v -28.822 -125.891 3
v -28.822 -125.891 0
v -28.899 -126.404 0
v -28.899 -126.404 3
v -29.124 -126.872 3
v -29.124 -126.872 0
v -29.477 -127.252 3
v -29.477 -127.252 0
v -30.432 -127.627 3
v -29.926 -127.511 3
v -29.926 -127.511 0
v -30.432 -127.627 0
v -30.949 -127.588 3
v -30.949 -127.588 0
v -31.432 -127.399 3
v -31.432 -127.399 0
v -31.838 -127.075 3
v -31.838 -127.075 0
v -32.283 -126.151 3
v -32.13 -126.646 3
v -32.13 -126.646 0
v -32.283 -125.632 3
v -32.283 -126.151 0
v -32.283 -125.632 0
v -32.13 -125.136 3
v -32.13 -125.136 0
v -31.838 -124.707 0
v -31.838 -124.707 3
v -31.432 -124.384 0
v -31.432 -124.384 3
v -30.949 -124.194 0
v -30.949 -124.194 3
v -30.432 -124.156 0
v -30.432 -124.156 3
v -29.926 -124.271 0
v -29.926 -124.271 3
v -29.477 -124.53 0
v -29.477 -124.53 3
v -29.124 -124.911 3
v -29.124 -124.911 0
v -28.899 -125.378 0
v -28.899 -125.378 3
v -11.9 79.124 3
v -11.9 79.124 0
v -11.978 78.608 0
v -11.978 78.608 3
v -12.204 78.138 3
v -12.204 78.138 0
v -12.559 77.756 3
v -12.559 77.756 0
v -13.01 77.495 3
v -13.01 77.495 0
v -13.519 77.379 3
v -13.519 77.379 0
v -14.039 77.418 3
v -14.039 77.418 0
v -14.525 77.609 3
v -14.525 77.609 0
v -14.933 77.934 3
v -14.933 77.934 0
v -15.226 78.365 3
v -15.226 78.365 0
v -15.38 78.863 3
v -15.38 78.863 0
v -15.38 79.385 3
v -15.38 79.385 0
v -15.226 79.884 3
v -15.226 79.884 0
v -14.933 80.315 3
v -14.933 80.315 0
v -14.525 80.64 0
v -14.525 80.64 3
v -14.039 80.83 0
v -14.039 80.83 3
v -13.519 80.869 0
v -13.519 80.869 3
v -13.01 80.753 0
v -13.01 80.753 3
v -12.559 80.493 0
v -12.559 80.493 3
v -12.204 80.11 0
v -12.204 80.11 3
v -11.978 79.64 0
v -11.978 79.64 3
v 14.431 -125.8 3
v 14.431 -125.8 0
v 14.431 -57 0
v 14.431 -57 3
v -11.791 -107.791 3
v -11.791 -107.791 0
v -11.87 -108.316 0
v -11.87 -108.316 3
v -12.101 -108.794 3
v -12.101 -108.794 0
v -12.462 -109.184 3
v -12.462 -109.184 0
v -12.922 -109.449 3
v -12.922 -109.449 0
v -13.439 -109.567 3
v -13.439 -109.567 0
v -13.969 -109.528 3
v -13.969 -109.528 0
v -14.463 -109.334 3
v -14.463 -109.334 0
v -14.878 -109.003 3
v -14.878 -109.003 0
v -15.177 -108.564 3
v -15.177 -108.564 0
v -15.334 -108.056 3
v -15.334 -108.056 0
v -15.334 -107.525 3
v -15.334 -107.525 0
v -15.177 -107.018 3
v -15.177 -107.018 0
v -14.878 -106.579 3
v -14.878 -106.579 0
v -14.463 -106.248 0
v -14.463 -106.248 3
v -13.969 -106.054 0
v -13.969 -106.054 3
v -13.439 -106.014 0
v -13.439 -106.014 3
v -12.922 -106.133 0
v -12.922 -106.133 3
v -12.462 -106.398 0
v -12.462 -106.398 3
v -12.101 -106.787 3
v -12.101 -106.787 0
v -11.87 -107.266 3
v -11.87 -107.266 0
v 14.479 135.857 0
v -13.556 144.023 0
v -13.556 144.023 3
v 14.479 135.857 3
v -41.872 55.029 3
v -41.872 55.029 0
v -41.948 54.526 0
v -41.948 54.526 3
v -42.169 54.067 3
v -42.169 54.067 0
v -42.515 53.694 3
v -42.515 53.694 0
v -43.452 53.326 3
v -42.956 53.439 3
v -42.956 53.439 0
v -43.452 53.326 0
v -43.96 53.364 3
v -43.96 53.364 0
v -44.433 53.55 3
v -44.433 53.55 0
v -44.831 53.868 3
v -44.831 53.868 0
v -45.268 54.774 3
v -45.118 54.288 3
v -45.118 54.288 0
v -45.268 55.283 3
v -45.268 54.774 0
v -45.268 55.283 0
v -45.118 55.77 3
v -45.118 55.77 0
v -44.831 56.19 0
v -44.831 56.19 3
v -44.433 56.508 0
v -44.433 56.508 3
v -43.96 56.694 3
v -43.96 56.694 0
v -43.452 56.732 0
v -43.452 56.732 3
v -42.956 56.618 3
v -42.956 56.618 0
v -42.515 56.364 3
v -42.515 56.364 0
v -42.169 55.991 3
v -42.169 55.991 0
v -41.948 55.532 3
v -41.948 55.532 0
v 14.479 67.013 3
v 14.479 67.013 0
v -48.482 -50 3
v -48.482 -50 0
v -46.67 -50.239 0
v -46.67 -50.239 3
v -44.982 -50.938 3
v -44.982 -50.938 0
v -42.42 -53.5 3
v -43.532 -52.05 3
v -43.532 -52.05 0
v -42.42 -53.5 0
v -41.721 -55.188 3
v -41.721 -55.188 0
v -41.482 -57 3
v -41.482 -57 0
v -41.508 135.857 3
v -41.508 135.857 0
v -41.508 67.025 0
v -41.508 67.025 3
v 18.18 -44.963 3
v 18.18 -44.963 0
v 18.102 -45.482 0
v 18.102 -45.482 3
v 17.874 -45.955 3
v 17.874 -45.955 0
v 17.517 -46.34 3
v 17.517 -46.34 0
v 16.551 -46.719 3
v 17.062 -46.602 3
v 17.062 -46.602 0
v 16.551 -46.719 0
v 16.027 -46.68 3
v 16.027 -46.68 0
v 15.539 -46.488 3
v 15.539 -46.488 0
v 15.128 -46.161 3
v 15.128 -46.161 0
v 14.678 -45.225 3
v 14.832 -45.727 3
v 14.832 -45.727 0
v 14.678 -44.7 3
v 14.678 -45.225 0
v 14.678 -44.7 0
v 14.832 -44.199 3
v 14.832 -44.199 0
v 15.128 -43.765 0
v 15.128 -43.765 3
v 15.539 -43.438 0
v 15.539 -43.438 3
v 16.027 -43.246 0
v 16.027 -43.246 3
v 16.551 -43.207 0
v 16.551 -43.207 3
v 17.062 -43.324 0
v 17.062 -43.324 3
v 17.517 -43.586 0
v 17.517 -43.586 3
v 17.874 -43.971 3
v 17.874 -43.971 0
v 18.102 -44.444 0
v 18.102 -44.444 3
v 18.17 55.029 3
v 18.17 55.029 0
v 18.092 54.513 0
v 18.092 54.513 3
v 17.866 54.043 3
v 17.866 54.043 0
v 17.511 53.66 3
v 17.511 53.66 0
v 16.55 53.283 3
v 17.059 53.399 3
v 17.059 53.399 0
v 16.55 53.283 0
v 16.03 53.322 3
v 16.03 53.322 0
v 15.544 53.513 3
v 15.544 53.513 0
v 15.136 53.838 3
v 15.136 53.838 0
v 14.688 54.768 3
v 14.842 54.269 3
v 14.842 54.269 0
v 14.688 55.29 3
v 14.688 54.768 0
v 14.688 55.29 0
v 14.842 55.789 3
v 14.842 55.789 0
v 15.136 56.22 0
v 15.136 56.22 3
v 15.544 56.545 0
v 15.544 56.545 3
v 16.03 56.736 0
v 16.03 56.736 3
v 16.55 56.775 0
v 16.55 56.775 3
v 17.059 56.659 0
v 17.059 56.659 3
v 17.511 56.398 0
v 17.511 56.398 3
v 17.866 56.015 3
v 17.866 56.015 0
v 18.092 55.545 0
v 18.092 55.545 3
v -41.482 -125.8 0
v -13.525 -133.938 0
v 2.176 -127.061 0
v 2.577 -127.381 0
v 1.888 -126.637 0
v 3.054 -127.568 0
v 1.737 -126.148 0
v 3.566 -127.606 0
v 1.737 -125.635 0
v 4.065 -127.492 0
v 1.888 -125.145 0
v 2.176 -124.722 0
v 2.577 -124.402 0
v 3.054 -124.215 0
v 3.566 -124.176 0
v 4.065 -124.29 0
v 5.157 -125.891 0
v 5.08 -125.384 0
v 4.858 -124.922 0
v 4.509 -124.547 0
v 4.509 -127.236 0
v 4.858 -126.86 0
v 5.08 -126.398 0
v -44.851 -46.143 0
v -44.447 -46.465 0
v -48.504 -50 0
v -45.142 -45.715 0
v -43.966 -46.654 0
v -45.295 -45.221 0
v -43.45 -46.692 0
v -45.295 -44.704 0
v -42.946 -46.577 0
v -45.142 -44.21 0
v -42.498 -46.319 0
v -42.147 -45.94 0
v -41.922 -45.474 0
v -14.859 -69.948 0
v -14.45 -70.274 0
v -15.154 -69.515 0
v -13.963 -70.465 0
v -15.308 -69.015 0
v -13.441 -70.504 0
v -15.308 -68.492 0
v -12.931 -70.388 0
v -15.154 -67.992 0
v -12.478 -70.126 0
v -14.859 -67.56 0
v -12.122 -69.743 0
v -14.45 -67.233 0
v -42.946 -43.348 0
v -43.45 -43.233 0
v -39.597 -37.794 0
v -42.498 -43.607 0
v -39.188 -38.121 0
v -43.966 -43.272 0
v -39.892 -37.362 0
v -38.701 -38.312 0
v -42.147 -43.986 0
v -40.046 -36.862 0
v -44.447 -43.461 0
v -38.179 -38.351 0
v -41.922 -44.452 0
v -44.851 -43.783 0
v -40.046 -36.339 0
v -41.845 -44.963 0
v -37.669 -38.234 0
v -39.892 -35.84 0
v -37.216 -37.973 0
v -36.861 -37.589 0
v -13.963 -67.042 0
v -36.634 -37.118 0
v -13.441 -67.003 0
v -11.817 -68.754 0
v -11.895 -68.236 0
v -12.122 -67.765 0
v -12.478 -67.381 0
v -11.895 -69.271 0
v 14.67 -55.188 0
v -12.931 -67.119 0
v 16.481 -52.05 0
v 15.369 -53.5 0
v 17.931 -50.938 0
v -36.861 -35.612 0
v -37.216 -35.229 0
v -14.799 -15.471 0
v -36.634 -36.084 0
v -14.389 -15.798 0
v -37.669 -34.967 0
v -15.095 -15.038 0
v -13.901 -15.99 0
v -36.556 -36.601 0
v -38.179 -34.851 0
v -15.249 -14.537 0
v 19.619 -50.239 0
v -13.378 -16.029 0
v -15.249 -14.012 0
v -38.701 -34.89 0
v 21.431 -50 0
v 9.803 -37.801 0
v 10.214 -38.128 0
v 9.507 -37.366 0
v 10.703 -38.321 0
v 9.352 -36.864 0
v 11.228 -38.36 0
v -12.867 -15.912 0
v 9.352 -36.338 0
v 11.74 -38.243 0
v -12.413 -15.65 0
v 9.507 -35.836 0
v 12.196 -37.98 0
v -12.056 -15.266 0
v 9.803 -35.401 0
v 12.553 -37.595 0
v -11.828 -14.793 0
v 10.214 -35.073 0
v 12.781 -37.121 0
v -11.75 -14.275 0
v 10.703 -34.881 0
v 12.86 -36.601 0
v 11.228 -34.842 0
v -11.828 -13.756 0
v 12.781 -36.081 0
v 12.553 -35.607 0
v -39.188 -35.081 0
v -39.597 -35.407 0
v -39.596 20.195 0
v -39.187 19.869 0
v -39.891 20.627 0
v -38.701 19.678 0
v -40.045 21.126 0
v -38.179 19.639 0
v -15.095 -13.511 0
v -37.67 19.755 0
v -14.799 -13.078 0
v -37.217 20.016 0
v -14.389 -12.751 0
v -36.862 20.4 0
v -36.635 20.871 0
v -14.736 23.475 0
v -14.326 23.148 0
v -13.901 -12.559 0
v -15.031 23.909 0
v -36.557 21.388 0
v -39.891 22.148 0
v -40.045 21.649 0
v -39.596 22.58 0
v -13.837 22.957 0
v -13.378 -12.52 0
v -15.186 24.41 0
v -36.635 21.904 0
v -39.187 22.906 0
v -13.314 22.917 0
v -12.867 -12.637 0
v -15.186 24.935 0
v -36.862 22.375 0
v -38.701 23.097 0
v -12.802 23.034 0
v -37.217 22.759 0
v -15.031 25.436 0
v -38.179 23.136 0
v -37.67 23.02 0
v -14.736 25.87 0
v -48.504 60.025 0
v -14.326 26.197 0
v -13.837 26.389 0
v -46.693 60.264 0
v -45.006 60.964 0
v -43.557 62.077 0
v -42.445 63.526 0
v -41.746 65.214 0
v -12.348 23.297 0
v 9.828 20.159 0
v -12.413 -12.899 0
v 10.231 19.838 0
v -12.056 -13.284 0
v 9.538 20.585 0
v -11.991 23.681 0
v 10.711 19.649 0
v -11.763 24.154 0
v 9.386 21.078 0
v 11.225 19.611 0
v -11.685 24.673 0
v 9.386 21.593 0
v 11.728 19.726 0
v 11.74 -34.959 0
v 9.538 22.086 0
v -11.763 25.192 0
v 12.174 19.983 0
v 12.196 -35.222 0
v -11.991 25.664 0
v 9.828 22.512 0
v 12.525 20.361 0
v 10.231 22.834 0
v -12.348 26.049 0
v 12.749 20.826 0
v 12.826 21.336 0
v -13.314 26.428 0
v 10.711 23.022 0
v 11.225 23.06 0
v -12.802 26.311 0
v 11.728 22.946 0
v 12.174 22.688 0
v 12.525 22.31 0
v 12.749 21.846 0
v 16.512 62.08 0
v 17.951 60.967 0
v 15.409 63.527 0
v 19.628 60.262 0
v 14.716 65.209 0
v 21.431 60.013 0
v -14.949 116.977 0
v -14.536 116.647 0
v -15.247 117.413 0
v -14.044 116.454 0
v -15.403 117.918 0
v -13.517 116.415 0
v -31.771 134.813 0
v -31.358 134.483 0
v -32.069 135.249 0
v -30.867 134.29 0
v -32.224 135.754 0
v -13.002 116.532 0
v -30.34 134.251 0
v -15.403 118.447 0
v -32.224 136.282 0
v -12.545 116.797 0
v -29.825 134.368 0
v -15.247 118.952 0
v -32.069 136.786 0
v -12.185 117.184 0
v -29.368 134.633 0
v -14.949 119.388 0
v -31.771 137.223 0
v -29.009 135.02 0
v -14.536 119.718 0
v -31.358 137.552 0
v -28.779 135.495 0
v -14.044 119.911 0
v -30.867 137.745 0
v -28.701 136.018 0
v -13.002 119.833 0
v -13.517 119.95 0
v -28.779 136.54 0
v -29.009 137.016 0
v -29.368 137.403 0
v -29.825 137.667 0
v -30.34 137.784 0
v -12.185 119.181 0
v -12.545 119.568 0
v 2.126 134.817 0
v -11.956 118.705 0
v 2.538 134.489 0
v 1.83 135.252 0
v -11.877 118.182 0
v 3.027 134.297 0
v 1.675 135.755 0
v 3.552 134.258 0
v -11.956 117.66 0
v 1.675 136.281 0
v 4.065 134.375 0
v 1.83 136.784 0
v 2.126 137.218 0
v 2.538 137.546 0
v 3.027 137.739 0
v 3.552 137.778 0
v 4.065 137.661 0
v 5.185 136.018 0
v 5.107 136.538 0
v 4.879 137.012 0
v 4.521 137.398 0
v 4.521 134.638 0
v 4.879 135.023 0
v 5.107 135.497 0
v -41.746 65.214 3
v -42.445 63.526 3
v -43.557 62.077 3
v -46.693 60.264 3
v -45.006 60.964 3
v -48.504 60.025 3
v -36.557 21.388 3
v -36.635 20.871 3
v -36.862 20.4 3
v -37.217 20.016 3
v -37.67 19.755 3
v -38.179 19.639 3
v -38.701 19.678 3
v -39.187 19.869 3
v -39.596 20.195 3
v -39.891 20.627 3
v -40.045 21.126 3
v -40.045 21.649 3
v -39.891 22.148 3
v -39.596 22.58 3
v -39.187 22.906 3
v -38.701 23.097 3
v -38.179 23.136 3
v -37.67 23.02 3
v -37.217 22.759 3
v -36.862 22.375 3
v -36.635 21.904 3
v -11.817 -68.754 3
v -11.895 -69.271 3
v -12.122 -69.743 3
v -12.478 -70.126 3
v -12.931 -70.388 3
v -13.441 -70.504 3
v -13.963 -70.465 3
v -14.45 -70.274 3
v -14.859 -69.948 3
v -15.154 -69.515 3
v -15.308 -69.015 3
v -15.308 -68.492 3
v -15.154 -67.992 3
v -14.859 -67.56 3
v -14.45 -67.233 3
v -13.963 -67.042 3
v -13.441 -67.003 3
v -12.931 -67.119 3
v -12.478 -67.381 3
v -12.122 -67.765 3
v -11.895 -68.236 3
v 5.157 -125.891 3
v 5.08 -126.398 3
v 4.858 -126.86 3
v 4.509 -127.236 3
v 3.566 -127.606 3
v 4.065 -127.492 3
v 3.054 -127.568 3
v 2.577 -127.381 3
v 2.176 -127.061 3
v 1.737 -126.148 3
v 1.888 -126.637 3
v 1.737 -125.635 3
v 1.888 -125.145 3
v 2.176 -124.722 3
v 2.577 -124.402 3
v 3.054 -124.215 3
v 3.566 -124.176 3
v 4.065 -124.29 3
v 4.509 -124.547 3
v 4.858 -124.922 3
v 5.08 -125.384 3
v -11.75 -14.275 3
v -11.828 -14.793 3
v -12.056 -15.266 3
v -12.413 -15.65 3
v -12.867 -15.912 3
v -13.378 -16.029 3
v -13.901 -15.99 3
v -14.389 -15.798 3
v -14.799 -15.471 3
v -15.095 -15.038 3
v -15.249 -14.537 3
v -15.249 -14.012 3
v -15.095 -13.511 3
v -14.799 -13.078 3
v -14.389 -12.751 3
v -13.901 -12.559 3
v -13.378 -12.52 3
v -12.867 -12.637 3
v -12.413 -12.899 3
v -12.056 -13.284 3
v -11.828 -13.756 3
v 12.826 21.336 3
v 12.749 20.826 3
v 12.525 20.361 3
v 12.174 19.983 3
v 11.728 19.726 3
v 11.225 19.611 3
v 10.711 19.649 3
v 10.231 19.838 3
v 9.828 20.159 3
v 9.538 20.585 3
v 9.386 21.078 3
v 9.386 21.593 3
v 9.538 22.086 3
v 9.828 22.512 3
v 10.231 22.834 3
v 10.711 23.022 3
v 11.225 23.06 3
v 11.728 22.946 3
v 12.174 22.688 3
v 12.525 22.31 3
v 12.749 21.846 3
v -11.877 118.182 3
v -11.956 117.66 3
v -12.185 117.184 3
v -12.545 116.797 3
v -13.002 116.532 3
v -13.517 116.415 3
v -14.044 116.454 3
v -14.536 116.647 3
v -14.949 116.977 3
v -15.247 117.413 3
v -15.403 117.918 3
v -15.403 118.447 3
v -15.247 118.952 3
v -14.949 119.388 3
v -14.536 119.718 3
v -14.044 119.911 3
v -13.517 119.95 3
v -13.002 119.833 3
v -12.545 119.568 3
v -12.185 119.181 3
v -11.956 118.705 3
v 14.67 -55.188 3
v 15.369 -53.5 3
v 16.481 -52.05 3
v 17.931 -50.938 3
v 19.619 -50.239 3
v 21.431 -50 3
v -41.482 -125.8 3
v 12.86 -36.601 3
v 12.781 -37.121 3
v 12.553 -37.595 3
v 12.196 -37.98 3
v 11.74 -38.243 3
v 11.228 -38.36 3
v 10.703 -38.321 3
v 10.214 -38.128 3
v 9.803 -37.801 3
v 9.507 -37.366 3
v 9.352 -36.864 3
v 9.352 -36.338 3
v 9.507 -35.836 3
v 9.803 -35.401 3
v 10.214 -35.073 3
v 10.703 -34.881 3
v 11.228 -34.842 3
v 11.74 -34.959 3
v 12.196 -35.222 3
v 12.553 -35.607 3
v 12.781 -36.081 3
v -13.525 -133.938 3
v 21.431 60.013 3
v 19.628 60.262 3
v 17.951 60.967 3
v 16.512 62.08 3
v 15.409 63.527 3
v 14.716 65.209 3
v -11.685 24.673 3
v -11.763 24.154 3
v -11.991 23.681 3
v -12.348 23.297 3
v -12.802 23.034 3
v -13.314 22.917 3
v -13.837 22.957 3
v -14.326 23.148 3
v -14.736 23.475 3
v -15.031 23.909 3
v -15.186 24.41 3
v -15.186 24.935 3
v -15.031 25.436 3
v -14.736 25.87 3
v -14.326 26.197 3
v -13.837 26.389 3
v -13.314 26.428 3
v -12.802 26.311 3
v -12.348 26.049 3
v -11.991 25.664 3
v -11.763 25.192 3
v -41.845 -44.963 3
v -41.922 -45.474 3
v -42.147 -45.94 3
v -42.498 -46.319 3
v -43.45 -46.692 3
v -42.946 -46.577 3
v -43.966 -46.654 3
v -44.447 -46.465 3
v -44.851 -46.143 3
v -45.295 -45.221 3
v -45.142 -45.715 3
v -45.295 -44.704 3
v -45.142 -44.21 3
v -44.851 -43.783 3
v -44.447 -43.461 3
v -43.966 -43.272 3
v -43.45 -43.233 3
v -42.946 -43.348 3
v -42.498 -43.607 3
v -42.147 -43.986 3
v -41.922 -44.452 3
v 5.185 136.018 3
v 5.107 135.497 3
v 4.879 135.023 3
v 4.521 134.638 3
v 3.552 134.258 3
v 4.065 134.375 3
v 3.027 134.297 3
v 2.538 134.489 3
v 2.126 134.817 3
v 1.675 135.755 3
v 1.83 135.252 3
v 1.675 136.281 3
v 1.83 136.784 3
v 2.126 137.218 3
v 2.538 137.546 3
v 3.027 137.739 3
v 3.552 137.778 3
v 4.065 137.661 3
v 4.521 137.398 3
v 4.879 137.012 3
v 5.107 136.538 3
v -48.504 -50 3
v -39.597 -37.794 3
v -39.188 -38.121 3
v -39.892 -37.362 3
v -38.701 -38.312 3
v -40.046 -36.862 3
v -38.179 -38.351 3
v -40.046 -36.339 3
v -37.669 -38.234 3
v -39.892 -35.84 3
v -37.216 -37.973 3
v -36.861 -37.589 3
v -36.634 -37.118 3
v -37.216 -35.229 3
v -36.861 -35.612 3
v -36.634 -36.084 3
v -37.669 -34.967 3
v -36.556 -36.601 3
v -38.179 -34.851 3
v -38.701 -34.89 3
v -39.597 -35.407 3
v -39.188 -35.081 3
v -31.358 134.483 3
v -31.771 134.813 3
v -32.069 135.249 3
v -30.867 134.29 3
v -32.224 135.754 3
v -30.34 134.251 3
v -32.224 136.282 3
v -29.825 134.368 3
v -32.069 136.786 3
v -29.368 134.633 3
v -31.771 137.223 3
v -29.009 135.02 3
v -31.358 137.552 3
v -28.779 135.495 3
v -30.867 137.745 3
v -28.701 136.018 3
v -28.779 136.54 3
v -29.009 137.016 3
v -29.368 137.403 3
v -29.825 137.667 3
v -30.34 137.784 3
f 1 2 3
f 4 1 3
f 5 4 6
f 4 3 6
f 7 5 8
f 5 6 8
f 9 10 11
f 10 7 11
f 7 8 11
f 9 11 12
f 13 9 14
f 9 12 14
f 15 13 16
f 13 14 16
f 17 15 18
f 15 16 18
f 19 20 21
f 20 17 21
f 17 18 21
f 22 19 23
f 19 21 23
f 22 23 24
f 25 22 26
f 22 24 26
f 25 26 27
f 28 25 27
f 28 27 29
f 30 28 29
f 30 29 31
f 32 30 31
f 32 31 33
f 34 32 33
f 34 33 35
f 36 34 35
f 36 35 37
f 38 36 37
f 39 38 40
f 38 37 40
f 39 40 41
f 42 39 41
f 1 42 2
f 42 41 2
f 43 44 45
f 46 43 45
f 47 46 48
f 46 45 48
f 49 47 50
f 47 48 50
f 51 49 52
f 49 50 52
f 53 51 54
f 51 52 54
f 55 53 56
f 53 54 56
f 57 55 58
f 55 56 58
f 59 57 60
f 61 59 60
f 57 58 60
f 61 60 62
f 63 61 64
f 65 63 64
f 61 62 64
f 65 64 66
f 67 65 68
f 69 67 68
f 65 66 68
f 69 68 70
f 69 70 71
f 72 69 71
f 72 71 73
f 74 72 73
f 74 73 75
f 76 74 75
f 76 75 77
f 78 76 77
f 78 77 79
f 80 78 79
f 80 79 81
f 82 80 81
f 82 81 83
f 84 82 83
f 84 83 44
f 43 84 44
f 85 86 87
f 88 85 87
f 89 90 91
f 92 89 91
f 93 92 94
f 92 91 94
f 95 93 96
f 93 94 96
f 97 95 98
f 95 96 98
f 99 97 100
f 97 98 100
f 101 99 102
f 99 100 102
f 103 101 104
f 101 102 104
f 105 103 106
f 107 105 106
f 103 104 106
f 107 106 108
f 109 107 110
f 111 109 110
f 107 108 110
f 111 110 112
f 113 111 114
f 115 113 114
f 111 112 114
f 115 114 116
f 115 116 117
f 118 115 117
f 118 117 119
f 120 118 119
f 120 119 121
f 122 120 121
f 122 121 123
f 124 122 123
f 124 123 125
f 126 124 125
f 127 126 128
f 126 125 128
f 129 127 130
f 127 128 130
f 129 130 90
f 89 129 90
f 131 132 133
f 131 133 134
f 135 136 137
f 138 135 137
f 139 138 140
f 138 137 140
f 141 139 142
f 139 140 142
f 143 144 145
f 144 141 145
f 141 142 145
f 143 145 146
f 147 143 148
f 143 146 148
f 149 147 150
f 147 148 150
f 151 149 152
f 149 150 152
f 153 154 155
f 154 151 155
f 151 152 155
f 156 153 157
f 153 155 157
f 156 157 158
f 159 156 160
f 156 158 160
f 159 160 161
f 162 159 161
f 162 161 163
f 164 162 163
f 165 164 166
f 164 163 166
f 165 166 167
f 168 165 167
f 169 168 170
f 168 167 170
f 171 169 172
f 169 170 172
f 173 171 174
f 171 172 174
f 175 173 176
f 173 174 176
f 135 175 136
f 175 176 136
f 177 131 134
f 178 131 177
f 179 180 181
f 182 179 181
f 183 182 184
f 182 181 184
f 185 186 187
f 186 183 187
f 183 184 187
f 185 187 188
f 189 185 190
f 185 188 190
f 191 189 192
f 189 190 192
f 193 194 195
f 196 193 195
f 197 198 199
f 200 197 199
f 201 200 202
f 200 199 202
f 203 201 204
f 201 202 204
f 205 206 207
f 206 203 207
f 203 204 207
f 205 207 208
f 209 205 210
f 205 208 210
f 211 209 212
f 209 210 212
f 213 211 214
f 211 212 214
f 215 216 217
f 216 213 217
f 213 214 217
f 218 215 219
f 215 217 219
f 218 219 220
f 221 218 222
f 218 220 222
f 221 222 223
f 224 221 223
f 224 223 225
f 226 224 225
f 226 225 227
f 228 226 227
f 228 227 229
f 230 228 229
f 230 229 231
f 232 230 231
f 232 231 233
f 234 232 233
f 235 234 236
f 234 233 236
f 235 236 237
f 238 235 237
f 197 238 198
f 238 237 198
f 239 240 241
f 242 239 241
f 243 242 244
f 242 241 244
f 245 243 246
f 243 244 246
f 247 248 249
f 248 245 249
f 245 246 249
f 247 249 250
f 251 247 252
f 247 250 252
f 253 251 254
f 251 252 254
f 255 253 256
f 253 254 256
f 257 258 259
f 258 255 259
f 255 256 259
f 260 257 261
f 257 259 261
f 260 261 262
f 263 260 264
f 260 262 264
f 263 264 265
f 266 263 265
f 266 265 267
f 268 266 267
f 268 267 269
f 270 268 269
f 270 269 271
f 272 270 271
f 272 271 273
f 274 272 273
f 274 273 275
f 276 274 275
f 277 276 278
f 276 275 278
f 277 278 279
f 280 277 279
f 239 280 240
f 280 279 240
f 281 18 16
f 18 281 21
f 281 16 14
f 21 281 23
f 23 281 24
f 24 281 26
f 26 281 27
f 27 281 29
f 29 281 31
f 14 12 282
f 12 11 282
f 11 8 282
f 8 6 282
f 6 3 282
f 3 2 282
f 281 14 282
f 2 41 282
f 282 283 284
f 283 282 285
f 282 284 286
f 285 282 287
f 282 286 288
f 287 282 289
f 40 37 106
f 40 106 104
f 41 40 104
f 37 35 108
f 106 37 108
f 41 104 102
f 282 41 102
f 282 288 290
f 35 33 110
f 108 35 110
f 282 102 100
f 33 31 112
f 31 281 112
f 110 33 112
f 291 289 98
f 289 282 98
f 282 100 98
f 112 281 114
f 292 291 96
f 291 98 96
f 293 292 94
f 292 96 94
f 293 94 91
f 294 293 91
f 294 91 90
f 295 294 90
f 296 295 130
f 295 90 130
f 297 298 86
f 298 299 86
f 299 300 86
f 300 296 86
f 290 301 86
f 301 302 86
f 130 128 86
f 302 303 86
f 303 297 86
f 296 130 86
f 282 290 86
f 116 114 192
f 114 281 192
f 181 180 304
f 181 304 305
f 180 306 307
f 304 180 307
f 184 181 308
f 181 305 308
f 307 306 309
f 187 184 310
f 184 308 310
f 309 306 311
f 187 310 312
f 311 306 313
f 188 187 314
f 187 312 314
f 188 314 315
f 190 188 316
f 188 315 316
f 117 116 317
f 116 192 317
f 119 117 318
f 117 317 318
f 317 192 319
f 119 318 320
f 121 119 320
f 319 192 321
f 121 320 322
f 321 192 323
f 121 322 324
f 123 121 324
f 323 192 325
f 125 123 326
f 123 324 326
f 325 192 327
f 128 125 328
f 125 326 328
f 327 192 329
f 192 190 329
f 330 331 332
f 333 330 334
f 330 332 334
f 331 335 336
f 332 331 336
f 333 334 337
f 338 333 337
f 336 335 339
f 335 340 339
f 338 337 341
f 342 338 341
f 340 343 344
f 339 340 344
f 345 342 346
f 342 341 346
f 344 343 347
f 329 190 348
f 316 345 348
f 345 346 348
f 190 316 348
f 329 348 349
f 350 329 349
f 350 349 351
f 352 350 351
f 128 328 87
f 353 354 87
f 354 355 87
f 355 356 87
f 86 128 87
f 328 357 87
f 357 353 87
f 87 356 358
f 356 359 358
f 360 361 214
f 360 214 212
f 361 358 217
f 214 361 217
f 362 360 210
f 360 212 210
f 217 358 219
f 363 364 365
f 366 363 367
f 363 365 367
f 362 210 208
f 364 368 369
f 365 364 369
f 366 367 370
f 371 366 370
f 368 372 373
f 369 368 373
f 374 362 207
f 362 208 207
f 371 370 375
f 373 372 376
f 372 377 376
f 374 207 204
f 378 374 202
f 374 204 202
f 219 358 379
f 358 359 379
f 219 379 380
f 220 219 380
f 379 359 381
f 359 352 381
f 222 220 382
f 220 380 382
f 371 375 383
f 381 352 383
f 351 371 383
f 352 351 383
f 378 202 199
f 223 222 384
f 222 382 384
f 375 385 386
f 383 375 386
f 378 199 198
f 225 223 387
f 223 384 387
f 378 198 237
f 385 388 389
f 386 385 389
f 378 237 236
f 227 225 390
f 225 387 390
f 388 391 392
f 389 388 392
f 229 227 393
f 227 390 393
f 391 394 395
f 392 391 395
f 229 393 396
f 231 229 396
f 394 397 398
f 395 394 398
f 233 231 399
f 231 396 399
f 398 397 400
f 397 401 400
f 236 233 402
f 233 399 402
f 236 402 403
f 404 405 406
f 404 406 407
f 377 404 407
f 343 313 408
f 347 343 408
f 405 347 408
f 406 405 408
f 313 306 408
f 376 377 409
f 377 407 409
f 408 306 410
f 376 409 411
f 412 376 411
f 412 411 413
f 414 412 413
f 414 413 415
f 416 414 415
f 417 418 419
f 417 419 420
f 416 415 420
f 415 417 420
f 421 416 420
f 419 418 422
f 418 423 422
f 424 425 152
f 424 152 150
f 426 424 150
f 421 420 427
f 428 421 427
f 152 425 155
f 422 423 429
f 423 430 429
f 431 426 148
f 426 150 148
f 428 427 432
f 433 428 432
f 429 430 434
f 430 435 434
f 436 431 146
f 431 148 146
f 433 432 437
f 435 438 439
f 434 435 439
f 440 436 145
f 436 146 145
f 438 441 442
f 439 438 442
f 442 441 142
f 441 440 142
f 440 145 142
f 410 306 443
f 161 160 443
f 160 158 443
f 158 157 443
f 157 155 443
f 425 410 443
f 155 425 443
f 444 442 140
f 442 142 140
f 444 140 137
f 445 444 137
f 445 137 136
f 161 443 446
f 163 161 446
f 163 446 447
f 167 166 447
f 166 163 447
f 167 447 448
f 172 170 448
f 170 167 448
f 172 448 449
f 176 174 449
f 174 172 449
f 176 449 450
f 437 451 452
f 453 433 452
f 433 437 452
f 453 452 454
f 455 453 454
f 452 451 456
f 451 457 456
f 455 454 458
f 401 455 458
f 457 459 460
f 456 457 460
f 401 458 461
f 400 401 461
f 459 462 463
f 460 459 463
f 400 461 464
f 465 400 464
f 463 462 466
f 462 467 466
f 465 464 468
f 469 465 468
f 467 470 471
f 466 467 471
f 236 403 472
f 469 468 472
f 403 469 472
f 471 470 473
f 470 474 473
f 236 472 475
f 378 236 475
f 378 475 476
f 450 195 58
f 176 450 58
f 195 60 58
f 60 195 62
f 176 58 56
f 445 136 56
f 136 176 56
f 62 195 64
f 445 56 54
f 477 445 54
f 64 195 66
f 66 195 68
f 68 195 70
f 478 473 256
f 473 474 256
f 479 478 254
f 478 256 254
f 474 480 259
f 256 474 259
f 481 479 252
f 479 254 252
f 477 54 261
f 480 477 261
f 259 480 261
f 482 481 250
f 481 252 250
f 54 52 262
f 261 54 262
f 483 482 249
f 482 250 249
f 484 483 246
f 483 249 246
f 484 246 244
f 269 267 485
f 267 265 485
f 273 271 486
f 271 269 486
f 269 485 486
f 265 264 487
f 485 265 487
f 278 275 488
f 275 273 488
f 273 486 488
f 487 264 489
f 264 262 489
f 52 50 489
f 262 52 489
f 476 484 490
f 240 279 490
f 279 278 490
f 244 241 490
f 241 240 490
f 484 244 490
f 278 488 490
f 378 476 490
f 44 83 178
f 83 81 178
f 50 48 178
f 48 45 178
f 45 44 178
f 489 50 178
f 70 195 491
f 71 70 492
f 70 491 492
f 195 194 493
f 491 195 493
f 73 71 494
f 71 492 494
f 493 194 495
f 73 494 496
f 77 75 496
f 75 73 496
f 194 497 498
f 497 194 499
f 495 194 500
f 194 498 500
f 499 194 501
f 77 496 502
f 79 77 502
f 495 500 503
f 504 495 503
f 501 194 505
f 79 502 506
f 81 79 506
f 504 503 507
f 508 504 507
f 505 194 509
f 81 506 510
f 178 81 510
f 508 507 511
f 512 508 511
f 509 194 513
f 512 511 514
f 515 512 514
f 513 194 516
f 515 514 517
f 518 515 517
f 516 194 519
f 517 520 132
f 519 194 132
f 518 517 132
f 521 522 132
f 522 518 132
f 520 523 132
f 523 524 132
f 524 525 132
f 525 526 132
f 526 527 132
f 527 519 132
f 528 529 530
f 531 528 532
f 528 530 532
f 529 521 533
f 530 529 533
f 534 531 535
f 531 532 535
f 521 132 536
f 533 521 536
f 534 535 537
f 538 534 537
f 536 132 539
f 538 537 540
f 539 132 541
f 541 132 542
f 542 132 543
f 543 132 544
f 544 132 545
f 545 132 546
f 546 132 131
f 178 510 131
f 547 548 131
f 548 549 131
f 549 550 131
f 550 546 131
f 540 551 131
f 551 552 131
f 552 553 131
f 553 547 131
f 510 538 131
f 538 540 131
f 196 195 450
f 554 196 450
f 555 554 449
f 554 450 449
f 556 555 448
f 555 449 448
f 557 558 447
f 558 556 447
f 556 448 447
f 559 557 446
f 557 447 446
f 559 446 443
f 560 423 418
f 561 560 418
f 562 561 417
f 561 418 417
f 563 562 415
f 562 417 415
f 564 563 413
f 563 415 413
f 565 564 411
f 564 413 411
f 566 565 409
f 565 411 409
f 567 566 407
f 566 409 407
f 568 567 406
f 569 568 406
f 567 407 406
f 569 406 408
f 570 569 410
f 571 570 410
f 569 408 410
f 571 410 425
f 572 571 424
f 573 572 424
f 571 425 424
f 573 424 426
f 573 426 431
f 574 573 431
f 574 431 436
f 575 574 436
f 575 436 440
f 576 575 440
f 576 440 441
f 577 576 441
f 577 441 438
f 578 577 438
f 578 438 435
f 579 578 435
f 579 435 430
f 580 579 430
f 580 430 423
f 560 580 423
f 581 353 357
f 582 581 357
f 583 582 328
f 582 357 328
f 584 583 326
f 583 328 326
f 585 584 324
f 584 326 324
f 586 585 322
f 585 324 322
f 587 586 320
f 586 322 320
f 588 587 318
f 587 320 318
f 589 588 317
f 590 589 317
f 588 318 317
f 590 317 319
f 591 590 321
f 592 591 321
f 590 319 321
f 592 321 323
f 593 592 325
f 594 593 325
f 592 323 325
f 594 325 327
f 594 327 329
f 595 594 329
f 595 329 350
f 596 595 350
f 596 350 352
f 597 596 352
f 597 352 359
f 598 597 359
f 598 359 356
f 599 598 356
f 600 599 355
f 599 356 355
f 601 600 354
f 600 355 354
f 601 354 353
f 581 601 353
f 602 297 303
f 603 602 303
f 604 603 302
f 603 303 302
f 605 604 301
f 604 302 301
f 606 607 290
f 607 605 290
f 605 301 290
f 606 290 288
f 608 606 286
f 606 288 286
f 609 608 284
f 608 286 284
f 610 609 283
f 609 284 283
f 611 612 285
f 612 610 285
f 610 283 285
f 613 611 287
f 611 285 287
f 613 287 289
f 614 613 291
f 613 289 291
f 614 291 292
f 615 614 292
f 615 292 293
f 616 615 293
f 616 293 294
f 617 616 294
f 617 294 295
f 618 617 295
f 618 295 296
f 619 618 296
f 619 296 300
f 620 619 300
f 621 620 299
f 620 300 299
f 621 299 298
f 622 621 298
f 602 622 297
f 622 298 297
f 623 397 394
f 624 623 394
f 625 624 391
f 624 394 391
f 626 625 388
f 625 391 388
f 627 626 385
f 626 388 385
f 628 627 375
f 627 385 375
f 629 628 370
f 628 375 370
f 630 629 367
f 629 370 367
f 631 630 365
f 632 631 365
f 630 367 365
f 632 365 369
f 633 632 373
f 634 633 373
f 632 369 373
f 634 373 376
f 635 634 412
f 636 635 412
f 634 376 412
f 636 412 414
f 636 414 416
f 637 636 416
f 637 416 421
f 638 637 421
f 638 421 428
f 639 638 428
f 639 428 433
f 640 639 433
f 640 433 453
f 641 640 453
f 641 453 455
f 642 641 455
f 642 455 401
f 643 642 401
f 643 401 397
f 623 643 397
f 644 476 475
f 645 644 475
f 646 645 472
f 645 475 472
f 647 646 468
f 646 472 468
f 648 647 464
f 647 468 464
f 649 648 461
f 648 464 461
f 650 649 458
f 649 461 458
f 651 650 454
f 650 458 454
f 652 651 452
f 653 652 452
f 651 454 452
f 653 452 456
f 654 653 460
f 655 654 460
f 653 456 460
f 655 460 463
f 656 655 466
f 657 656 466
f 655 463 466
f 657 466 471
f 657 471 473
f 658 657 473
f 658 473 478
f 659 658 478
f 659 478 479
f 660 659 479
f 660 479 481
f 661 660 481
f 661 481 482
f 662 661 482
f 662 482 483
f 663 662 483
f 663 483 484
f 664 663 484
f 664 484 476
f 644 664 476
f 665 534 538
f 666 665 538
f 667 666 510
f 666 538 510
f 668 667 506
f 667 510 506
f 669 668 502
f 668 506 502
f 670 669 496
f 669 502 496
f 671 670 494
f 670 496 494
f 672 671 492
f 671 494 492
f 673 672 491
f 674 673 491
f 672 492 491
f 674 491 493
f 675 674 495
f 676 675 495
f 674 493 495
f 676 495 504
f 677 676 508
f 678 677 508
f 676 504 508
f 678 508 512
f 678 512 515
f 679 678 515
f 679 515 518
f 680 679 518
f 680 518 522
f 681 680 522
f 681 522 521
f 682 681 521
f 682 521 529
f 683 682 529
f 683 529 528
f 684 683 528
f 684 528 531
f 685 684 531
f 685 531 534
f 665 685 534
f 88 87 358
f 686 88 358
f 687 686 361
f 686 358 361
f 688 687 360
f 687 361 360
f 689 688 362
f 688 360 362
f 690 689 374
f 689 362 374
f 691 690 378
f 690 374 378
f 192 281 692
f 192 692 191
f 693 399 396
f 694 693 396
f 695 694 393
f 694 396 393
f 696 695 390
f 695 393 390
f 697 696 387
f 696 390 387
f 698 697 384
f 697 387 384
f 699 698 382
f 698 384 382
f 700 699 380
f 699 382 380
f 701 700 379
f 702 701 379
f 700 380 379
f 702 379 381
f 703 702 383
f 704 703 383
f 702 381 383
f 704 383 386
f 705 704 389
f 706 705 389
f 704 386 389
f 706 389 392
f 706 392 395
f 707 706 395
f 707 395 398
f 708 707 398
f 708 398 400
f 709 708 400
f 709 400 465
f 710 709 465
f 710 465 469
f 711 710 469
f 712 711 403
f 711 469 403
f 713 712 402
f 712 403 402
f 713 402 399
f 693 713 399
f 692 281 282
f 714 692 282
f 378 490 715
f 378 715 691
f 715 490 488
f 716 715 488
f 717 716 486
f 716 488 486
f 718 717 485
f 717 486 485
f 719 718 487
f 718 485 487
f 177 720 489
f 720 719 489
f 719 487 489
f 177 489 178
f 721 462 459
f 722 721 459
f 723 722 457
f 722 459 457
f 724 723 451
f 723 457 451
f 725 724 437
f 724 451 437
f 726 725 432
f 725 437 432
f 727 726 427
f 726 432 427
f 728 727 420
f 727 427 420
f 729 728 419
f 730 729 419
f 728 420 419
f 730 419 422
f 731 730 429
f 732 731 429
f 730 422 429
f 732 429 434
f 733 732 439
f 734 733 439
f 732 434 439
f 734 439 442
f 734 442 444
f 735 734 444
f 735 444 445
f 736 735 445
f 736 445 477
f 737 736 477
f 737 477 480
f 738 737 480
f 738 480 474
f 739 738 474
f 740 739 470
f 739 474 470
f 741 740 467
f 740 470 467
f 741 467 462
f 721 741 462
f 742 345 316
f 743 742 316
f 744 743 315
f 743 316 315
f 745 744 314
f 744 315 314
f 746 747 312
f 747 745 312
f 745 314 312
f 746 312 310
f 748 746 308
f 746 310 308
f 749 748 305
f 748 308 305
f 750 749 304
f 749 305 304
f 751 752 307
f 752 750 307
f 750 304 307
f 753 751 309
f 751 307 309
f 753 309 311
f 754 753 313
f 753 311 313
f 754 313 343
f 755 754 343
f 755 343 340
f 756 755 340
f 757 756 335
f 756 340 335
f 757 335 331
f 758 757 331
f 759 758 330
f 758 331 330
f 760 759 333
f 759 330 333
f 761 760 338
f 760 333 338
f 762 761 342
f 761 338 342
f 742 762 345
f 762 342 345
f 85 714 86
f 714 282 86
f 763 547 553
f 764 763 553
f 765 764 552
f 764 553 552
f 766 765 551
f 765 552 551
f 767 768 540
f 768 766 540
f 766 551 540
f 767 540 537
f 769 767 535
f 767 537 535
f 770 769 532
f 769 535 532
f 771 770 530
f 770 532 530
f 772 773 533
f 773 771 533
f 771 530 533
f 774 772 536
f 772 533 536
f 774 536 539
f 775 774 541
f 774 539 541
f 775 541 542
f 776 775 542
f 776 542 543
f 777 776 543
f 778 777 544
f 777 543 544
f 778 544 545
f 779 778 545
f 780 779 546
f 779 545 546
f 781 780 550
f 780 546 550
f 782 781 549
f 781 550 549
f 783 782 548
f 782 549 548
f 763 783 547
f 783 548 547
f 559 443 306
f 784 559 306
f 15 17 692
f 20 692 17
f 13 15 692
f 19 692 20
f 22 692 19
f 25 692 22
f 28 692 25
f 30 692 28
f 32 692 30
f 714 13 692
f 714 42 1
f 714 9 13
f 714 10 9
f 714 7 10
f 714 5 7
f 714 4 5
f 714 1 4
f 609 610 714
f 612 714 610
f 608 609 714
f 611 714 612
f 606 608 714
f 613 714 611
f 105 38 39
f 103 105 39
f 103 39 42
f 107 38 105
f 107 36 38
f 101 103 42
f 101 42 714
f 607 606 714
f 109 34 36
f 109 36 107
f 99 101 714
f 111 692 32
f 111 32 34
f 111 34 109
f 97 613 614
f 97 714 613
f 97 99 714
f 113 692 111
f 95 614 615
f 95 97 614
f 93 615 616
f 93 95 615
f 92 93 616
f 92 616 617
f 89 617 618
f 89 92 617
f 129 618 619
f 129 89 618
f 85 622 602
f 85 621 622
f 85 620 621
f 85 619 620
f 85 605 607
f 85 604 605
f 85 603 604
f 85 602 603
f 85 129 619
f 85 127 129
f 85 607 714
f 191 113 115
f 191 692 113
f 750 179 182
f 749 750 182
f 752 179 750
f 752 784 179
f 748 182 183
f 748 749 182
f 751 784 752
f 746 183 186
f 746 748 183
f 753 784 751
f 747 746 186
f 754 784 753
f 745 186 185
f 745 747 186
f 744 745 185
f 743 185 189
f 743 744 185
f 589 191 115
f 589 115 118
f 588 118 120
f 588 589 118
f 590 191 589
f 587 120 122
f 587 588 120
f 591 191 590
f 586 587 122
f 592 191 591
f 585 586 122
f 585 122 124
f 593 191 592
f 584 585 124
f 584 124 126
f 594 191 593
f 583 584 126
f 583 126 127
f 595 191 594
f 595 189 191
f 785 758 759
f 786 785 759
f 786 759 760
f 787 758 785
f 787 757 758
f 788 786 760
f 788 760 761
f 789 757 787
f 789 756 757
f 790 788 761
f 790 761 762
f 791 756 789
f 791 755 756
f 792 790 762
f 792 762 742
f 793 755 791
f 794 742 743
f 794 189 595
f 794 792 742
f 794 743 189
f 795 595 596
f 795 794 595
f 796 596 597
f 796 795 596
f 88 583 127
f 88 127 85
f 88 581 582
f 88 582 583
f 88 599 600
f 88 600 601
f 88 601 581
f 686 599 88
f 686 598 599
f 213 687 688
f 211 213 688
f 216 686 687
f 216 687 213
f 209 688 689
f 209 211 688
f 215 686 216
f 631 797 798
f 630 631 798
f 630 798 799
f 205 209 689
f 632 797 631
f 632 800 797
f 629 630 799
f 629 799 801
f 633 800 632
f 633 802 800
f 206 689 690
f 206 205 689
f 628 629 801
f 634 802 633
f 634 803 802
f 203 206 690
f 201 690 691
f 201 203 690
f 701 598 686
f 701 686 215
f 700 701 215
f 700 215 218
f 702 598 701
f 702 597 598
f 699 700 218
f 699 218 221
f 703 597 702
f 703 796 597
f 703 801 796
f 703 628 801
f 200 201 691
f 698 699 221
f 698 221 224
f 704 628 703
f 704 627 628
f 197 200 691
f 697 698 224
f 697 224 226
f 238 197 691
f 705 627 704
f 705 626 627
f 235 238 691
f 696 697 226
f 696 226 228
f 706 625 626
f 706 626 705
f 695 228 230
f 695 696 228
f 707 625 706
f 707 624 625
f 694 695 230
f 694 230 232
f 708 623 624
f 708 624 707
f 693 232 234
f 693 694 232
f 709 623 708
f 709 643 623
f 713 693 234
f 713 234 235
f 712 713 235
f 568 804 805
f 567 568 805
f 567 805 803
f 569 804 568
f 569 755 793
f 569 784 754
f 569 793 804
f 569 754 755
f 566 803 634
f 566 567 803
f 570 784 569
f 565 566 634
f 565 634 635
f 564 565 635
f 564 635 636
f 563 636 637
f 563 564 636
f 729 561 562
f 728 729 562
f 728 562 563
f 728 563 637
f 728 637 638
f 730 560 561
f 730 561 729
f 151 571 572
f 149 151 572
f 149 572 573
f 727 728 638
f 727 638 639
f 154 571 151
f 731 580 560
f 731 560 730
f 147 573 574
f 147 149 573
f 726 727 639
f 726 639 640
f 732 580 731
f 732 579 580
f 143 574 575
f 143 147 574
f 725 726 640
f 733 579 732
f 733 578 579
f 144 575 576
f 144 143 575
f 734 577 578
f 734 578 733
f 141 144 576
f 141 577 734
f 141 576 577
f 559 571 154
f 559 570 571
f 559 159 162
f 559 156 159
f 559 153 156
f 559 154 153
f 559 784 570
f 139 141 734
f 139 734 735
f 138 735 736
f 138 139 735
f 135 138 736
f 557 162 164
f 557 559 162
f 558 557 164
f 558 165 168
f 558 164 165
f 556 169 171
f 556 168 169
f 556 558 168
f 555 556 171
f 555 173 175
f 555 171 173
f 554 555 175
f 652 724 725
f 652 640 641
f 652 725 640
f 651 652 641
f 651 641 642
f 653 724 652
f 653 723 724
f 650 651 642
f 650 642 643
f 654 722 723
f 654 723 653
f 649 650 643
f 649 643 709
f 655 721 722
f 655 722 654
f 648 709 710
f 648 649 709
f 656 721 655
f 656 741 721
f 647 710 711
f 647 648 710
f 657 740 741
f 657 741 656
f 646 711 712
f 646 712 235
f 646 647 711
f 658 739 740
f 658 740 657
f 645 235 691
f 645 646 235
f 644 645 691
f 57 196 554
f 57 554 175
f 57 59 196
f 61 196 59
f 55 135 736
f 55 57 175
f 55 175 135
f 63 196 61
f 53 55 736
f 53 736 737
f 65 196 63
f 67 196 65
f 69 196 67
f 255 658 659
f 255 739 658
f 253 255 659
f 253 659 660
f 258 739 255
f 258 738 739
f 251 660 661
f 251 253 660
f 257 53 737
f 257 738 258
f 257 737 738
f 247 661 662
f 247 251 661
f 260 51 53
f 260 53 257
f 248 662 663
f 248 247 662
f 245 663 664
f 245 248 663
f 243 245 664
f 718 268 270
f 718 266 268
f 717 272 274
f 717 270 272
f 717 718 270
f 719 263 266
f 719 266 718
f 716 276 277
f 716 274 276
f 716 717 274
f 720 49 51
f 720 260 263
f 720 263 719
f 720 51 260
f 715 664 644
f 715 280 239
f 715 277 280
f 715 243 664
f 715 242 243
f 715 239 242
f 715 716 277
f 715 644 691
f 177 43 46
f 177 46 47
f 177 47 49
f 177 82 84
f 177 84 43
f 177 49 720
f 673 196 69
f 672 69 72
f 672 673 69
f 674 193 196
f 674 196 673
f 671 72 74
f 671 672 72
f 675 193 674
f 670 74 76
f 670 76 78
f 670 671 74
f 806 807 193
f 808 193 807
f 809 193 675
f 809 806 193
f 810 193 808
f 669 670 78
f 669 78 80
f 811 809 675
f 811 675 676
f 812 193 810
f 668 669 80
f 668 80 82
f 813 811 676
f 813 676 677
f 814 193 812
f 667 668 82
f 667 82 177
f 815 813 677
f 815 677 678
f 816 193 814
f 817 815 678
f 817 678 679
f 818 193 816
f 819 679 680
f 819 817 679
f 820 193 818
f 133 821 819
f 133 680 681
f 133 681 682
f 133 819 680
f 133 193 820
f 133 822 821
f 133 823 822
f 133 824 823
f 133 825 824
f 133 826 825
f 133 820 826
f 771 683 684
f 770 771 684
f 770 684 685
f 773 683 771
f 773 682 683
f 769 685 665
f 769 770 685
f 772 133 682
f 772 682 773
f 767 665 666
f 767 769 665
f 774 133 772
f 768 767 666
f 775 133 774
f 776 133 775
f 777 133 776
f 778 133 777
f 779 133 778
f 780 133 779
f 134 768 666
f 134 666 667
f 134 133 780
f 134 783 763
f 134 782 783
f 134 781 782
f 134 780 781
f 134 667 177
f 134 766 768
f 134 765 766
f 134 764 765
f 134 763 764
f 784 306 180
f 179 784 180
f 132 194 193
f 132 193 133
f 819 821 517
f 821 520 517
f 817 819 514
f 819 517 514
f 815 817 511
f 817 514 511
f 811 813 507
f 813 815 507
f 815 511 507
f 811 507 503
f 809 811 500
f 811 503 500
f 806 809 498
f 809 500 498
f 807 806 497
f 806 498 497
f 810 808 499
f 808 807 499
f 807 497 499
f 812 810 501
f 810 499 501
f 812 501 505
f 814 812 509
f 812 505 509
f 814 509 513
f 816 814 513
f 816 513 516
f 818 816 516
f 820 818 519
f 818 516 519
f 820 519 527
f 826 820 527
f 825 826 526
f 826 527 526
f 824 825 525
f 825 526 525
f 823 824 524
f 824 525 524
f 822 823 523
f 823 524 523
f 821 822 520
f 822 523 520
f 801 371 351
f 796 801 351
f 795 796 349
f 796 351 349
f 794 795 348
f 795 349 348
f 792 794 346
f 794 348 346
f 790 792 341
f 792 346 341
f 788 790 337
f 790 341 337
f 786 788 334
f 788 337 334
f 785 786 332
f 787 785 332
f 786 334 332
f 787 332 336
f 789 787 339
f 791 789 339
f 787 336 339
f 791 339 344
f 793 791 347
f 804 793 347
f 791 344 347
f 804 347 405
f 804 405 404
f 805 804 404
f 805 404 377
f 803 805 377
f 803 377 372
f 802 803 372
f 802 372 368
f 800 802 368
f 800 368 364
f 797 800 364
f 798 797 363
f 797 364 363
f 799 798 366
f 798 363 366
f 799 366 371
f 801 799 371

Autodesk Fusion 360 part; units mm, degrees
sketch "Skizze1" plane through (0, 0, 0) normal (0, 0, 1) x (1, 0, 0)
  line L0 (-48.5045, 60.0252) -> (-48.5045, -50)
  line L1 (21.4307, 60.0126) -> (21.4307, -50)
  line L2 (-41.5077, 135.8568) -> (-13.5563, 144.0233)
  line L3 (-13.5563, 144.0233) -> (14.4793, 135.8568)
  line L4 (-41.4821, -125.8001) -> (-13.5254, -133.9377)
  line L5 (-13.5254, -133.9377) -> (14.4312, -125.8001)
  line L6 (14.4312, -125.8001) -> (14.4312, -57)
  line L7 (-41.4821, -125.8001) -> (-41.4821, -57)
  line L8 (-41.5077, 135.8568) -> (-41.5077, 66.6867)
  line L9 (14.4793, 135.8568) -> (14.4793, 66.6867)
  circle A0 centre (3.4202, 136.0177) radius 1.7651
  circle A1 centre (-30.4724, 136.0177) radius 1.7717
  circle A2 centre (-30.5621, -125.8912) radius 1.7405
  circle A3 centre (3.437, -125.8912) radius 1.7197
  circle A4 centre (-43.5796, -44.9629) radius 1.7343
  circle A5 centre (16.4191, -44.9629) radius 1.761
  circle A6 centre (-43.5796, 55.0289) radius 1.7075
  circle A7 centre (16.4191, 55.0289) radius 1.7507
  line L10 (21.4307, 60.0126) -> (21.4793, 60.0126)
  line L11 (14.4793, 67.0126) -> (14.4793, 66.6867)
  line L12 (-41.5077, 66.6867) -> (-41.5077, 67.0252)
  line L13 (-48.5077, 60.0252) -> (-48.5045, 60.0252)
  line L14 (-48.5045, -50) -> (-48.4821, -50)
  line L15 (21.4312, -50) -> (21.4307, -50)
  arc A8 (21.4312, -50) -> (14.4312, -57) centre (21.4312, -57) ccw
  arc A9 (-41.4821, -57) -> (-48.4821, -50) centre (-48.4821, -57) ccw
  arc A10 (-48.5077, 60.0252) -> (-41.5077, 67.0252) centre (-48.5077, 67.0252) ccw
  arc A11 (14.4793, 67.0126) -> (21.4793, 60.0126) centre (21.4793, 67.0126) ccw
  dimension "d1" = 7
  dimension "d2" = 7
  dimension "d3" = 7
  dimension "d4" = 7
extrude "Extrusion1" add sketch "Skizze1" along normal blind 3
sketch "Skizze2" plane through (0, 0, 0) normal (0, 0, 1) x (1, 0, 0)
  circle A0 centre (-13.6498, 118.1825) radius 1.7726
  circle A1 centre (-13.6498, 79.1243) radius 1.75
  circle A2 centre (-13.4454, 24.6727) radius 1.7602
  circle A3 centre (-13.5095, -14.2747) radius 1.7594
  circle A4 centre (-38.3105, 21.3875) radius 1.7537
  circle A5 centre (-38.3105, -36.6009) radius 1.7548
  circle A6 centre (11.0959, -36.6009) radius 1.7639
  circle A7 centre (11.0959, 21.3357) radius 1.7296
  circle A8 centre (-13.5725, -68.7537) radius 1.7556
  circle A9 centre (-13.5725, -107.7909) radius 1.7814
  dimension "d7" = 3.5
extrude "Extrusion2" cut sketch "Skizze2" along normal blind 10
